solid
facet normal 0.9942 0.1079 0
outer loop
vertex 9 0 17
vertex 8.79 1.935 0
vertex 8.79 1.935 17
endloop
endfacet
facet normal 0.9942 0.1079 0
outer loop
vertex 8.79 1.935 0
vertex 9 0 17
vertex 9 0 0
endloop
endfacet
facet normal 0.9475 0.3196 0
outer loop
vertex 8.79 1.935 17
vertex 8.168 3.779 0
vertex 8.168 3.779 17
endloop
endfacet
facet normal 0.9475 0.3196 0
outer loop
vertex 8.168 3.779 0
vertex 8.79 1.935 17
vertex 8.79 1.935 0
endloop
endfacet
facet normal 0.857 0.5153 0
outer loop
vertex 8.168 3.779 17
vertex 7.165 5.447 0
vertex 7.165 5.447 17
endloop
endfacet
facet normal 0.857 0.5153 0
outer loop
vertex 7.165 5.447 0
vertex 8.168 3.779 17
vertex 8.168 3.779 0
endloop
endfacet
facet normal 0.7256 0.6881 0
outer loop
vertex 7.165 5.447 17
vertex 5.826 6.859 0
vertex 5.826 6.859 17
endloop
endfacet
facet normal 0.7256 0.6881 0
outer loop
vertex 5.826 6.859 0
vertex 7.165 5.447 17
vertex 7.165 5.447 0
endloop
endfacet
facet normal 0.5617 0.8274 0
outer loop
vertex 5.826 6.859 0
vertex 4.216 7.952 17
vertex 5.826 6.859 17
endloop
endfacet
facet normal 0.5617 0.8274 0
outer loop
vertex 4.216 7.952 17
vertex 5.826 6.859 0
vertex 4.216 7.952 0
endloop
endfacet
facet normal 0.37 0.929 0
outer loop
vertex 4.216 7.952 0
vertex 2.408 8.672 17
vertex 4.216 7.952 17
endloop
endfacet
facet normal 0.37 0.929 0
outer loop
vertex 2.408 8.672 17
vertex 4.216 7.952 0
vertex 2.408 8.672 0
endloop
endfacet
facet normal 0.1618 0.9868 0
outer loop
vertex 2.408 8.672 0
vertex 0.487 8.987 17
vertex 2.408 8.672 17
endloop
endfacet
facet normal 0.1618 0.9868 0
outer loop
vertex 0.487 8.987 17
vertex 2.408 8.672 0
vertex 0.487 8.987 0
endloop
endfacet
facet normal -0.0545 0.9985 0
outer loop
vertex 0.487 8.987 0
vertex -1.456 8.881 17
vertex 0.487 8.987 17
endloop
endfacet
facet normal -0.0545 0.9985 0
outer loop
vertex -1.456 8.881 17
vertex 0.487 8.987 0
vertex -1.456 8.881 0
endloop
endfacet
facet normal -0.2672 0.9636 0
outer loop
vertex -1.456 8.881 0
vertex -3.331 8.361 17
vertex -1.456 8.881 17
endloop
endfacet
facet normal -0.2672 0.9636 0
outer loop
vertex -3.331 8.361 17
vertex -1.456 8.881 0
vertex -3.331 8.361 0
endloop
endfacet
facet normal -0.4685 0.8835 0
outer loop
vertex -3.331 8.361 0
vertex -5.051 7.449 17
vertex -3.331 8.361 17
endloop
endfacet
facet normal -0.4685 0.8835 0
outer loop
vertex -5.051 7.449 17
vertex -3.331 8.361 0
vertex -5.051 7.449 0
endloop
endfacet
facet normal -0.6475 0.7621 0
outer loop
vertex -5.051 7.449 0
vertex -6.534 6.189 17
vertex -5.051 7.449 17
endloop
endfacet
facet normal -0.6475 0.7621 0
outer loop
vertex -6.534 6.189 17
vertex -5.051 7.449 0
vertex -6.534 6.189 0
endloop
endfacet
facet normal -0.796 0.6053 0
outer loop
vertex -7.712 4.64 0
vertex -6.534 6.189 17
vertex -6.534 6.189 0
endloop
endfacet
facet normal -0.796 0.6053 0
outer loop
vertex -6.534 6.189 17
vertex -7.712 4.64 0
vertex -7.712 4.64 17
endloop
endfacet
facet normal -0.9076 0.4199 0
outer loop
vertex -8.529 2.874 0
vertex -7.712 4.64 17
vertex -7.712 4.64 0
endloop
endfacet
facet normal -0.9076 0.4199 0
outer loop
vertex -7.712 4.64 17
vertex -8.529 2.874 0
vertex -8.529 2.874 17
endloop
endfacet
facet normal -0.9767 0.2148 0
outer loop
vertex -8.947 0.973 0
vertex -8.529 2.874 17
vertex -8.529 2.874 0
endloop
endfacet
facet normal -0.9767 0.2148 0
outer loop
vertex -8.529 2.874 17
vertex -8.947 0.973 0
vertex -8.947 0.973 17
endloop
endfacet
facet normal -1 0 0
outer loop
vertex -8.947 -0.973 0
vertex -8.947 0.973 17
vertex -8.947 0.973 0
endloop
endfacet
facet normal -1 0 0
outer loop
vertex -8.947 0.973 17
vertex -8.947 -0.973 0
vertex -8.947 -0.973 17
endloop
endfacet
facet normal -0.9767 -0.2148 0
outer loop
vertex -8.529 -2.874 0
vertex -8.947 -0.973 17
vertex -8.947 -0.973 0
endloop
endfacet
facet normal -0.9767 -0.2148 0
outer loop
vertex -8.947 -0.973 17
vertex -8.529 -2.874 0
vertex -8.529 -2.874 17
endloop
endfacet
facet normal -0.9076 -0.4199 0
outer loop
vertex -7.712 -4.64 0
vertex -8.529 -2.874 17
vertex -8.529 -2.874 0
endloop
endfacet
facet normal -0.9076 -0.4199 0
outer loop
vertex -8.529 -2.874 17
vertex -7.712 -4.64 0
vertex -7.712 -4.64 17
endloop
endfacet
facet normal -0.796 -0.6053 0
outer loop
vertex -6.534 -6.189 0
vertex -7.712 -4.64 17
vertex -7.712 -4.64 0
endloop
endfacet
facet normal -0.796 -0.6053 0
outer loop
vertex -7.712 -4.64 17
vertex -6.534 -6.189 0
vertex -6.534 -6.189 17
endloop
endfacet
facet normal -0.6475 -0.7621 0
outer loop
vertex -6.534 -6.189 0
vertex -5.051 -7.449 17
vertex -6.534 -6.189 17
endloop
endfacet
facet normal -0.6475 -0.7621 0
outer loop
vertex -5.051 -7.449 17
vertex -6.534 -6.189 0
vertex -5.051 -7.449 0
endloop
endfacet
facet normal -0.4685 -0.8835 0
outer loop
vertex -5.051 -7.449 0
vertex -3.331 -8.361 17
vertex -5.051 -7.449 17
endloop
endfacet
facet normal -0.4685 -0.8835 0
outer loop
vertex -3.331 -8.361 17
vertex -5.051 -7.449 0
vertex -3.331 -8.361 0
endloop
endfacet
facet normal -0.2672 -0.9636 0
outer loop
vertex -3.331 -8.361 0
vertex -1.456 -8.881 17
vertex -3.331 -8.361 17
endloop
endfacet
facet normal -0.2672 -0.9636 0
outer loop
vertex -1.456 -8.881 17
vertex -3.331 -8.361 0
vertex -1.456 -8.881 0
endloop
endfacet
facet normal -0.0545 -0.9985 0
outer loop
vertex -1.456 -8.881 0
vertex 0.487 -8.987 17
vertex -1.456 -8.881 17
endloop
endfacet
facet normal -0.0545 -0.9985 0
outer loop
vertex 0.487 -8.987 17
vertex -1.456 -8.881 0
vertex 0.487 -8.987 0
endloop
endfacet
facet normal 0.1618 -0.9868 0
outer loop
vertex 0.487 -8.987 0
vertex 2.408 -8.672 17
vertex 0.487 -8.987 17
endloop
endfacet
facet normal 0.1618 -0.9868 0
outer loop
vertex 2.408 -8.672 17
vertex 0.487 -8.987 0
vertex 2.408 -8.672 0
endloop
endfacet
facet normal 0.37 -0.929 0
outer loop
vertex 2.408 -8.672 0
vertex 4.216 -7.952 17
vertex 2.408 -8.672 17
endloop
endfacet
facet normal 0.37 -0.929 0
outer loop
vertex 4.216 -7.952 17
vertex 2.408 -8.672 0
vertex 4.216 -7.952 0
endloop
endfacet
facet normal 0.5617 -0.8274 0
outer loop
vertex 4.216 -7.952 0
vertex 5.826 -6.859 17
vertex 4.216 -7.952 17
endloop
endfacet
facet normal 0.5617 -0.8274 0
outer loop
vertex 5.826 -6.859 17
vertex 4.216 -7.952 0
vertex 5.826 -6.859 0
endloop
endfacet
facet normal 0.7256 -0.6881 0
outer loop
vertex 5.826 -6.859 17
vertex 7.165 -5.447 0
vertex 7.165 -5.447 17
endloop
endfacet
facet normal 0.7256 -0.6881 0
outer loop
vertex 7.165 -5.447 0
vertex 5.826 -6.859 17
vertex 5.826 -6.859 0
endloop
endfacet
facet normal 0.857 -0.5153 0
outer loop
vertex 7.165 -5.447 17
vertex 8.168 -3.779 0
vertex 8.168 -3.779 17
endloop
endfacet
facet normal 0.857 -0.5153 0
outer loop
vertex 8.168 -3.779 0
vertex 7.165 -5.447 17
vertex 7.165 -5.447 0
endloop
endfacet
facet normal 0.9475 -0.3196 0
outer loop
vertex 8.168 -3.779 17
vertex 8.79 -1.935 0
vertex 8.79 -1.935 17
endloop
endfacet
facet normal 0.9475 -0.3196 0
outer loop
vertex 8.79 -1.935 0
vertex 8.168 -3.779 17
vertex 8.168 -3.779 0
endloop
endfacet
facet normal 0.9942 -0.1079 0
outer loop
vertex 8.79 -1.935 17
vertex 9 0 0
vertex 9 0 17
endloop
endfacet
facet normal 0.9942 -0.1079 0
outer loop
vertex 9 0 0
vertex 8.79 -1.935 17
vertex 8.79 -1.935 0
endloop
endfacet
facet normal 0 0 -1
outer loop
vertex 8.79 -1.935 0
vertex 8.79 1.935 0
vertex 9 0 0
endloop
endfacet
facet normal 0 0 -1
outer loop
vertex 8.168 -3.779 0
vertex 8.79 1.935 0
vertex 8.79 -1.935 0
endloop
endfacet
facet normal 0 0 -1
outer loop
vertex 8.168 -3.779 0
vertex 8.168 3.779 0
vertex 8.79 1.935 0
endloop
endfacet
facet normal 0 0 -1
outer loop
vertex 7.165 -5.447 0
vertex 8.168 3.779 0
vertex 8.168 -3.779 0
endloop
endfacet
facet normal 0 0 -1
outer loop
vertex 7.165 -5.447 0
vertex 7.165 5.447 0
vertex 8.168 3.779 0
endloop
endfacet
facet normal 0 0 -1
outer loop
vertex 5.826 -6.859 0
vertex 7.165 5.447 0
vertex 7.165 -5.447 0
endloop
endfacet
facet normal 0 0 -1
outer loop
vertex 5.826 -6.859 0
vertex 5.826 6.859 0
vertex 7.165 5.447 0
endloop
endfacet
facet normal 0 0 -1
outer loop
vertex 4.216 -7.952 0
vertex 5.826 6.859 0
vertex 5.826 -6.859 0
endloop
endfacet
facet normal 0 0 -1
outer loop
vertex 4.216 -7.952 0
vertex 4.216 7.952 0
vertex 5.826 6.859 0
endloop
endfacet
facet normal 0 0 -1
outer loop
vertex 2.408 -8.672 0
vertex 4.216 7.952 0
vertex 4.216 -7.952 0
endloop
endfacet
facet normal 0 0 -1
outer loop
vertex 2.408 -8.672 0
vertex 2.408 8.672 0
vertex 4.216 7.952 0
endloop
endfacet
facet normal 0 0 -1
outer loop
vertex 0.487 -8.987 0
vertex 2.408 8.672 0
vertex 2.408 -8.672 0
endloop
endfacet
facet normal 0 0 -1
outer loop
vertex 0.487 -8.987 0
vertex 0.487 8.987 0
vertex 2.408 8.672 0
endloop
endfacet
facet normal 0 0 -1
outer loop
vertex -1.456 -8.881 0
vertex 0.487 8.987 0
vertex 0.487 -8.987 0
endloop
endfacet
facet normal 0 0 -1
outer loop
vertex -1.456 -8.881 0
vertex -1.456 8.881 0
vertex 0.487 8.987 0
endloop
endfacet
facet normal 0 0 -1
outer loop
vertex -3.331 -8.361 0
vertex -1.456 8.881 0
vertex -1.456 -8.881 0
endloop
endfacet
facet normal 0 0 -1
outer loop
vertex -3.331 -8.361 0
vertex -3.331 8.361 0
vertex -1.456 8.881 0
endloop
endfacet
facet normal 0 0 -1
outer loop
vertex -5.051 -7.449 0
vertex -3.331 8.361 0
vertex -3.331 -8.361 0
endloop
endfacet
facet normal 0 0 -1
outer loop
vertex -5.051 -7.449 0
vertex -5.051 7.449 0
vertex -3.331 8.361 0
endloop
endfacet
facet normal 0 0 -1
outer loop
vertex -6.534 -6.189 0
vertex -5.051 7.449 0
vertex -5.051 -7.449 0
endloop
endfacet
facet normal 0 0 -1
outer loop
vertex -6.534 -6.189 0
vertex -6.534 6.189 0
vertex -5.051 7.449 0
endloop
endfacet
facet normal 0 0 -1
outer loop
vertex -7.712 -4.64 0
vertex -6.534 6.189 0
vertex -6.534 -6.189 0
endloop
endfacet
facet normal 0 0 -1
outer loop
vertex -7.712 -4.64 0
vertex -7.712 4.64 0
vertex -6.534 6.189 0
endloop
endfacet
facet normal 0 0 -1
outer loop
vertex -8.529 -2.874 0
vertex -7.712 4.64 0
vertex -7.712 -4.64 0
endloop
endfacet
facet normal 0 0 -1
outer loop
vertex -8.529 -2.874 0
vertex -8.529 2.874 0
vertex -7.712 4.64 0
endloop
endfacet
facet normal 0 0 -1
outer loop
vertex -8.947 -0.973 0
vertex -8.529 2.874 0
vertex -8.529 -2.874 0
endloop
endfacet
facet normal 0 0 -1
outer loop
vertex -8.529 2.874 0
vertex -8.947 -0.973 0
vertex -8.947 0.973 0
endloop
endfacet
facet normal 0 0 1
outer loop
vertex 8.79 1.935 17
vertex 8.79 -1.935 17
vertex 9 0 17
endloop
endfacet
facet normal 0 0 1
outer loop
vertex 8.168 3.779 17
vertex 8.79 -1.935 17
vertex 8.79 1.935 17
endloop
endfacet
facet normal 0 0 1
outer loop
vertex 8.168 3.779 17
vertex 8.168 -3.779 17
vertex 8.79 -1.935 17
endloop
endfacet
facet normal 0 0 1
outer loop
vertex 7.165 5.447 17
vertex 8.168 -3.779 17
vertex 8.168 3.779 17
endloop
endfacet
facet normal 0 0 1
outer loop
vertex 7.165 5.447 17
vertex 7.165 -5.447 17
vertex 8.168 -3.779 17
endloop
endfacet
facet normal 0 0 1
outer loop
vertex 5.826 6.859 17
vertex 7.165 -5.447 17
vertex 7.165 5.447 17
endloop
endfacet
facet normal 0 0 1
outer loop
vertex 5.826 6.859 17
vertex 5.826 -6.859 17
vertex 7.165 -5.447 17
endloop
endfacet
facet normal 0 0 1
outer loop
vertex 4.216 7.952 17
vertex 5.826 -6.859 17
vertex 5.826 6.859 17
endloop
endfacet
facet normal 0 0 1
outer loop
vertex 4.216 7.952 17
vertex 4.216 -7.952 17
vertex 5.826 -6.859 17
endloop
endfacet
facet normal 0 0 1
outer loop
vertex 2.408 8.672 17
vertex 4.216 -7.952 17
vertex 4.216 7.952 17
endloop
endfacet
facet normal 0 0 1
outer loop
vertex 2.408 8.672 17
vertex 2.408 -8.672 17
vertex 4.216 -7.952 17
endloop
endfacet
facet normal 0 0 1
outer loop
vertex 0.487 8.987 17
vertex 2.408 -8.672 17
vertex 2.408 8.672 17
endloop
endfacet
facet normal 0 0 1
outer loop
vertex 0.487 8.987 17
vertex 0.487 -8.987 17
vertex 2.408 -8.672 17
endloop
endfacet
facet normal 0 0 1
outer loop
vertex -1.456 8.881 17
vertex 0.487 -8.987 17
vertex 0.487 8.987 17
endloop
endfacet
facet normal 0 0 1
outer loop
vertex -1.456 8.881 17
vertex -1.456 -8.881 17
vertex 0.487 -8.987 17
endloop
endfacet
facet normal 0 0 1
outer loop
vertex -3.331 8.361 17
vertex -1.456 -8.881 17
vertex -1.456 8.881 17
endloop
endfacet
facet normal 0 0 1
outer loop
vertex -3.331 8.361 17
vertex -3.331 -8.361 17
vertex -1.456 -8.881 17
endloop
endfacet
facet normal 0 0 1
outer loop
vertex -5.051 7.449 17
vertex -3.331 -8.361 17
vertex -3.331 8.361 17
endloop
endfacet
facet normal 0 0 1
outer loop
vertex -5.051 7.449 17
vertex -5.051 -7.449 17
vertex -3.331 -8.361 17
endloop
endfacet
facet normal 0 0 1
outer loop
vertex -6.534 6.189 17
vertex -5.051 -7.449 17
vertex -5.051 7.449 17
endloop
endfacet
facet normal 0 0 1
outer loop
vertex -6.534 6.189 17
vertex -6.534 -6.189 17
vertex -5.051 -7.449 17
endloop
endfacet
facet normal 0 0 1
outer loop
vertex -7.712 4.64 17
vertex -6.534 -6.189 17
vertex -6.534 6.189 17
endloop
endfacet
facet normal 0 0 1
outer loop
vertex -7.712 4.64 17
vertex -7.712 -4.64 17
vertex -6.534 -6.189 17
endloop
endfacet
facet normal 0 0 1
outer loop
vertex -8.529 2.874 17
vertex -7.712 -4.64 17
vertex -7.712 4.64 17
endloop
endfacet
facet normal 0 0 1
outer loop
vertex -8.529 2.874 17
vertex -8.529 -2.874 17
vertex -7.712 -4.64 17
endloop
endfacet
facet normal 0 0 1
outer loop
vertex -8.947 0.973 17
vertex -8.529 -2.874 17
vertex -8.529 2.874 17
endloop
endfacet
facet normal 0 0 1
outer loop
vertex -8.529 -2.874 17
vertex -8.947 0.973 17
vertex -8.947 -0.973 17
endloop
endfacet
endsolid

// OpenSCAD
// Generated by SolidPython 1.0.1 on 2020-07-29 00:46:45


cylinder(h = 17, r1 = 9, r2 = 9);
/***********************************************
*********      SolidPython code:      **********
************************************************
 
# import packages: SolidPython
from solid import *
from solid.utils import *
from itertools import chain, combinations, permutations


class Resize:

    def __init__(self, scad_file):
        self.scad_file = scad_file
        #self.scad_file = import_scad(scad_file)
        # cone/cylinder param:
        self.r1 = 0
        self.r2 = 0
        self.h = 0
        # rectangular prism param:
        self.w = 0
        self.l = 0
        # ellipse param:
        self.r = 0

    # import OpenScad code (file name corresponds to shape)


    # classify shape + parameters
    def assign(self, param1, param2, param3):
        if self.scad_file == 'cone.scad':
            self.r1 = param1
            self.r2 = param2
            self.h = param3
        elif self.scad_file == 'cylinder.scad':
            self.r1 = param1
            self.r2 = param2
            self.h = param3
        elif self.scad_file == 'rectangularPrism.scad':
            self.h = param1
            self.l = param2
            self.w = param3
        else:
            self.r = param1
            self.h = param2

    # resize parameters
    def iterate(self):
        x = range(3, 20, 2)
        i = 1
        if self.scad_file == 'cone.scad':
            tempList = list(permutations(x, 2))
            for temp in tempList:
                param1 = temp[0]
                param2 = temp[1]
                filepath = 'produced_scad_files/' + 'cone' + str(param1) + '_' + str(param2) + '_' + '.scad'
                scad_render_to_file(cylinder(h=param1, r1=param2, r2=0), filepath)

        elif self.scad_file == 'cylinder.scad':
            tempList = list(permutations(x, 3))
            for temp in tempList:
                param1 = temp[0]
                param2 = temp[1]
                filepath = 'produced_scad_files/' + 'cylinder' + str(param1) + '_' + str(param2) + '_' + '.scad'
                scad_render_to_file(cylinder(h=param1, r1=param2, r2=param2), filepath)

        elif self.scad_file == 'rectangularPrism.scad':
            tempList = list(permutations(x, 3))
            for temp in tempList:
                param1 = temp[0]
                param2 = temp[1]
                param3 = temp[2]
                filepath = 'produced_scad_files/' + 'rectangularPrism' + str(param1) + '_' + str(param2) + '_' + str(
                    param3) + '.scad'
                scad_render_to_file(cube(size=(param1, param2, param3)), filepath)

        elif self.scad_file == 'ellipse.scad':
            tempList = list(permutations(x, 4))
            for temp in tempList:
                param1 = temp[0]
                param2 = temp[1]
                param3 = temp[2]
                param4 = temp[3]
                filepath = 'produced_scad_files/' + 'ellipse' + str(param1) + '_' + str(param2) + '_' + str(param3) + '_' + str(param4) + '.scad'
                scad_render_to_file(scale([param1, param2, param3])(sphere(r=param4)), filepath)

    def render_to_scadfile(self):
        scad_render_to_file(scad, 'example.scad') 
 
************************************************/
